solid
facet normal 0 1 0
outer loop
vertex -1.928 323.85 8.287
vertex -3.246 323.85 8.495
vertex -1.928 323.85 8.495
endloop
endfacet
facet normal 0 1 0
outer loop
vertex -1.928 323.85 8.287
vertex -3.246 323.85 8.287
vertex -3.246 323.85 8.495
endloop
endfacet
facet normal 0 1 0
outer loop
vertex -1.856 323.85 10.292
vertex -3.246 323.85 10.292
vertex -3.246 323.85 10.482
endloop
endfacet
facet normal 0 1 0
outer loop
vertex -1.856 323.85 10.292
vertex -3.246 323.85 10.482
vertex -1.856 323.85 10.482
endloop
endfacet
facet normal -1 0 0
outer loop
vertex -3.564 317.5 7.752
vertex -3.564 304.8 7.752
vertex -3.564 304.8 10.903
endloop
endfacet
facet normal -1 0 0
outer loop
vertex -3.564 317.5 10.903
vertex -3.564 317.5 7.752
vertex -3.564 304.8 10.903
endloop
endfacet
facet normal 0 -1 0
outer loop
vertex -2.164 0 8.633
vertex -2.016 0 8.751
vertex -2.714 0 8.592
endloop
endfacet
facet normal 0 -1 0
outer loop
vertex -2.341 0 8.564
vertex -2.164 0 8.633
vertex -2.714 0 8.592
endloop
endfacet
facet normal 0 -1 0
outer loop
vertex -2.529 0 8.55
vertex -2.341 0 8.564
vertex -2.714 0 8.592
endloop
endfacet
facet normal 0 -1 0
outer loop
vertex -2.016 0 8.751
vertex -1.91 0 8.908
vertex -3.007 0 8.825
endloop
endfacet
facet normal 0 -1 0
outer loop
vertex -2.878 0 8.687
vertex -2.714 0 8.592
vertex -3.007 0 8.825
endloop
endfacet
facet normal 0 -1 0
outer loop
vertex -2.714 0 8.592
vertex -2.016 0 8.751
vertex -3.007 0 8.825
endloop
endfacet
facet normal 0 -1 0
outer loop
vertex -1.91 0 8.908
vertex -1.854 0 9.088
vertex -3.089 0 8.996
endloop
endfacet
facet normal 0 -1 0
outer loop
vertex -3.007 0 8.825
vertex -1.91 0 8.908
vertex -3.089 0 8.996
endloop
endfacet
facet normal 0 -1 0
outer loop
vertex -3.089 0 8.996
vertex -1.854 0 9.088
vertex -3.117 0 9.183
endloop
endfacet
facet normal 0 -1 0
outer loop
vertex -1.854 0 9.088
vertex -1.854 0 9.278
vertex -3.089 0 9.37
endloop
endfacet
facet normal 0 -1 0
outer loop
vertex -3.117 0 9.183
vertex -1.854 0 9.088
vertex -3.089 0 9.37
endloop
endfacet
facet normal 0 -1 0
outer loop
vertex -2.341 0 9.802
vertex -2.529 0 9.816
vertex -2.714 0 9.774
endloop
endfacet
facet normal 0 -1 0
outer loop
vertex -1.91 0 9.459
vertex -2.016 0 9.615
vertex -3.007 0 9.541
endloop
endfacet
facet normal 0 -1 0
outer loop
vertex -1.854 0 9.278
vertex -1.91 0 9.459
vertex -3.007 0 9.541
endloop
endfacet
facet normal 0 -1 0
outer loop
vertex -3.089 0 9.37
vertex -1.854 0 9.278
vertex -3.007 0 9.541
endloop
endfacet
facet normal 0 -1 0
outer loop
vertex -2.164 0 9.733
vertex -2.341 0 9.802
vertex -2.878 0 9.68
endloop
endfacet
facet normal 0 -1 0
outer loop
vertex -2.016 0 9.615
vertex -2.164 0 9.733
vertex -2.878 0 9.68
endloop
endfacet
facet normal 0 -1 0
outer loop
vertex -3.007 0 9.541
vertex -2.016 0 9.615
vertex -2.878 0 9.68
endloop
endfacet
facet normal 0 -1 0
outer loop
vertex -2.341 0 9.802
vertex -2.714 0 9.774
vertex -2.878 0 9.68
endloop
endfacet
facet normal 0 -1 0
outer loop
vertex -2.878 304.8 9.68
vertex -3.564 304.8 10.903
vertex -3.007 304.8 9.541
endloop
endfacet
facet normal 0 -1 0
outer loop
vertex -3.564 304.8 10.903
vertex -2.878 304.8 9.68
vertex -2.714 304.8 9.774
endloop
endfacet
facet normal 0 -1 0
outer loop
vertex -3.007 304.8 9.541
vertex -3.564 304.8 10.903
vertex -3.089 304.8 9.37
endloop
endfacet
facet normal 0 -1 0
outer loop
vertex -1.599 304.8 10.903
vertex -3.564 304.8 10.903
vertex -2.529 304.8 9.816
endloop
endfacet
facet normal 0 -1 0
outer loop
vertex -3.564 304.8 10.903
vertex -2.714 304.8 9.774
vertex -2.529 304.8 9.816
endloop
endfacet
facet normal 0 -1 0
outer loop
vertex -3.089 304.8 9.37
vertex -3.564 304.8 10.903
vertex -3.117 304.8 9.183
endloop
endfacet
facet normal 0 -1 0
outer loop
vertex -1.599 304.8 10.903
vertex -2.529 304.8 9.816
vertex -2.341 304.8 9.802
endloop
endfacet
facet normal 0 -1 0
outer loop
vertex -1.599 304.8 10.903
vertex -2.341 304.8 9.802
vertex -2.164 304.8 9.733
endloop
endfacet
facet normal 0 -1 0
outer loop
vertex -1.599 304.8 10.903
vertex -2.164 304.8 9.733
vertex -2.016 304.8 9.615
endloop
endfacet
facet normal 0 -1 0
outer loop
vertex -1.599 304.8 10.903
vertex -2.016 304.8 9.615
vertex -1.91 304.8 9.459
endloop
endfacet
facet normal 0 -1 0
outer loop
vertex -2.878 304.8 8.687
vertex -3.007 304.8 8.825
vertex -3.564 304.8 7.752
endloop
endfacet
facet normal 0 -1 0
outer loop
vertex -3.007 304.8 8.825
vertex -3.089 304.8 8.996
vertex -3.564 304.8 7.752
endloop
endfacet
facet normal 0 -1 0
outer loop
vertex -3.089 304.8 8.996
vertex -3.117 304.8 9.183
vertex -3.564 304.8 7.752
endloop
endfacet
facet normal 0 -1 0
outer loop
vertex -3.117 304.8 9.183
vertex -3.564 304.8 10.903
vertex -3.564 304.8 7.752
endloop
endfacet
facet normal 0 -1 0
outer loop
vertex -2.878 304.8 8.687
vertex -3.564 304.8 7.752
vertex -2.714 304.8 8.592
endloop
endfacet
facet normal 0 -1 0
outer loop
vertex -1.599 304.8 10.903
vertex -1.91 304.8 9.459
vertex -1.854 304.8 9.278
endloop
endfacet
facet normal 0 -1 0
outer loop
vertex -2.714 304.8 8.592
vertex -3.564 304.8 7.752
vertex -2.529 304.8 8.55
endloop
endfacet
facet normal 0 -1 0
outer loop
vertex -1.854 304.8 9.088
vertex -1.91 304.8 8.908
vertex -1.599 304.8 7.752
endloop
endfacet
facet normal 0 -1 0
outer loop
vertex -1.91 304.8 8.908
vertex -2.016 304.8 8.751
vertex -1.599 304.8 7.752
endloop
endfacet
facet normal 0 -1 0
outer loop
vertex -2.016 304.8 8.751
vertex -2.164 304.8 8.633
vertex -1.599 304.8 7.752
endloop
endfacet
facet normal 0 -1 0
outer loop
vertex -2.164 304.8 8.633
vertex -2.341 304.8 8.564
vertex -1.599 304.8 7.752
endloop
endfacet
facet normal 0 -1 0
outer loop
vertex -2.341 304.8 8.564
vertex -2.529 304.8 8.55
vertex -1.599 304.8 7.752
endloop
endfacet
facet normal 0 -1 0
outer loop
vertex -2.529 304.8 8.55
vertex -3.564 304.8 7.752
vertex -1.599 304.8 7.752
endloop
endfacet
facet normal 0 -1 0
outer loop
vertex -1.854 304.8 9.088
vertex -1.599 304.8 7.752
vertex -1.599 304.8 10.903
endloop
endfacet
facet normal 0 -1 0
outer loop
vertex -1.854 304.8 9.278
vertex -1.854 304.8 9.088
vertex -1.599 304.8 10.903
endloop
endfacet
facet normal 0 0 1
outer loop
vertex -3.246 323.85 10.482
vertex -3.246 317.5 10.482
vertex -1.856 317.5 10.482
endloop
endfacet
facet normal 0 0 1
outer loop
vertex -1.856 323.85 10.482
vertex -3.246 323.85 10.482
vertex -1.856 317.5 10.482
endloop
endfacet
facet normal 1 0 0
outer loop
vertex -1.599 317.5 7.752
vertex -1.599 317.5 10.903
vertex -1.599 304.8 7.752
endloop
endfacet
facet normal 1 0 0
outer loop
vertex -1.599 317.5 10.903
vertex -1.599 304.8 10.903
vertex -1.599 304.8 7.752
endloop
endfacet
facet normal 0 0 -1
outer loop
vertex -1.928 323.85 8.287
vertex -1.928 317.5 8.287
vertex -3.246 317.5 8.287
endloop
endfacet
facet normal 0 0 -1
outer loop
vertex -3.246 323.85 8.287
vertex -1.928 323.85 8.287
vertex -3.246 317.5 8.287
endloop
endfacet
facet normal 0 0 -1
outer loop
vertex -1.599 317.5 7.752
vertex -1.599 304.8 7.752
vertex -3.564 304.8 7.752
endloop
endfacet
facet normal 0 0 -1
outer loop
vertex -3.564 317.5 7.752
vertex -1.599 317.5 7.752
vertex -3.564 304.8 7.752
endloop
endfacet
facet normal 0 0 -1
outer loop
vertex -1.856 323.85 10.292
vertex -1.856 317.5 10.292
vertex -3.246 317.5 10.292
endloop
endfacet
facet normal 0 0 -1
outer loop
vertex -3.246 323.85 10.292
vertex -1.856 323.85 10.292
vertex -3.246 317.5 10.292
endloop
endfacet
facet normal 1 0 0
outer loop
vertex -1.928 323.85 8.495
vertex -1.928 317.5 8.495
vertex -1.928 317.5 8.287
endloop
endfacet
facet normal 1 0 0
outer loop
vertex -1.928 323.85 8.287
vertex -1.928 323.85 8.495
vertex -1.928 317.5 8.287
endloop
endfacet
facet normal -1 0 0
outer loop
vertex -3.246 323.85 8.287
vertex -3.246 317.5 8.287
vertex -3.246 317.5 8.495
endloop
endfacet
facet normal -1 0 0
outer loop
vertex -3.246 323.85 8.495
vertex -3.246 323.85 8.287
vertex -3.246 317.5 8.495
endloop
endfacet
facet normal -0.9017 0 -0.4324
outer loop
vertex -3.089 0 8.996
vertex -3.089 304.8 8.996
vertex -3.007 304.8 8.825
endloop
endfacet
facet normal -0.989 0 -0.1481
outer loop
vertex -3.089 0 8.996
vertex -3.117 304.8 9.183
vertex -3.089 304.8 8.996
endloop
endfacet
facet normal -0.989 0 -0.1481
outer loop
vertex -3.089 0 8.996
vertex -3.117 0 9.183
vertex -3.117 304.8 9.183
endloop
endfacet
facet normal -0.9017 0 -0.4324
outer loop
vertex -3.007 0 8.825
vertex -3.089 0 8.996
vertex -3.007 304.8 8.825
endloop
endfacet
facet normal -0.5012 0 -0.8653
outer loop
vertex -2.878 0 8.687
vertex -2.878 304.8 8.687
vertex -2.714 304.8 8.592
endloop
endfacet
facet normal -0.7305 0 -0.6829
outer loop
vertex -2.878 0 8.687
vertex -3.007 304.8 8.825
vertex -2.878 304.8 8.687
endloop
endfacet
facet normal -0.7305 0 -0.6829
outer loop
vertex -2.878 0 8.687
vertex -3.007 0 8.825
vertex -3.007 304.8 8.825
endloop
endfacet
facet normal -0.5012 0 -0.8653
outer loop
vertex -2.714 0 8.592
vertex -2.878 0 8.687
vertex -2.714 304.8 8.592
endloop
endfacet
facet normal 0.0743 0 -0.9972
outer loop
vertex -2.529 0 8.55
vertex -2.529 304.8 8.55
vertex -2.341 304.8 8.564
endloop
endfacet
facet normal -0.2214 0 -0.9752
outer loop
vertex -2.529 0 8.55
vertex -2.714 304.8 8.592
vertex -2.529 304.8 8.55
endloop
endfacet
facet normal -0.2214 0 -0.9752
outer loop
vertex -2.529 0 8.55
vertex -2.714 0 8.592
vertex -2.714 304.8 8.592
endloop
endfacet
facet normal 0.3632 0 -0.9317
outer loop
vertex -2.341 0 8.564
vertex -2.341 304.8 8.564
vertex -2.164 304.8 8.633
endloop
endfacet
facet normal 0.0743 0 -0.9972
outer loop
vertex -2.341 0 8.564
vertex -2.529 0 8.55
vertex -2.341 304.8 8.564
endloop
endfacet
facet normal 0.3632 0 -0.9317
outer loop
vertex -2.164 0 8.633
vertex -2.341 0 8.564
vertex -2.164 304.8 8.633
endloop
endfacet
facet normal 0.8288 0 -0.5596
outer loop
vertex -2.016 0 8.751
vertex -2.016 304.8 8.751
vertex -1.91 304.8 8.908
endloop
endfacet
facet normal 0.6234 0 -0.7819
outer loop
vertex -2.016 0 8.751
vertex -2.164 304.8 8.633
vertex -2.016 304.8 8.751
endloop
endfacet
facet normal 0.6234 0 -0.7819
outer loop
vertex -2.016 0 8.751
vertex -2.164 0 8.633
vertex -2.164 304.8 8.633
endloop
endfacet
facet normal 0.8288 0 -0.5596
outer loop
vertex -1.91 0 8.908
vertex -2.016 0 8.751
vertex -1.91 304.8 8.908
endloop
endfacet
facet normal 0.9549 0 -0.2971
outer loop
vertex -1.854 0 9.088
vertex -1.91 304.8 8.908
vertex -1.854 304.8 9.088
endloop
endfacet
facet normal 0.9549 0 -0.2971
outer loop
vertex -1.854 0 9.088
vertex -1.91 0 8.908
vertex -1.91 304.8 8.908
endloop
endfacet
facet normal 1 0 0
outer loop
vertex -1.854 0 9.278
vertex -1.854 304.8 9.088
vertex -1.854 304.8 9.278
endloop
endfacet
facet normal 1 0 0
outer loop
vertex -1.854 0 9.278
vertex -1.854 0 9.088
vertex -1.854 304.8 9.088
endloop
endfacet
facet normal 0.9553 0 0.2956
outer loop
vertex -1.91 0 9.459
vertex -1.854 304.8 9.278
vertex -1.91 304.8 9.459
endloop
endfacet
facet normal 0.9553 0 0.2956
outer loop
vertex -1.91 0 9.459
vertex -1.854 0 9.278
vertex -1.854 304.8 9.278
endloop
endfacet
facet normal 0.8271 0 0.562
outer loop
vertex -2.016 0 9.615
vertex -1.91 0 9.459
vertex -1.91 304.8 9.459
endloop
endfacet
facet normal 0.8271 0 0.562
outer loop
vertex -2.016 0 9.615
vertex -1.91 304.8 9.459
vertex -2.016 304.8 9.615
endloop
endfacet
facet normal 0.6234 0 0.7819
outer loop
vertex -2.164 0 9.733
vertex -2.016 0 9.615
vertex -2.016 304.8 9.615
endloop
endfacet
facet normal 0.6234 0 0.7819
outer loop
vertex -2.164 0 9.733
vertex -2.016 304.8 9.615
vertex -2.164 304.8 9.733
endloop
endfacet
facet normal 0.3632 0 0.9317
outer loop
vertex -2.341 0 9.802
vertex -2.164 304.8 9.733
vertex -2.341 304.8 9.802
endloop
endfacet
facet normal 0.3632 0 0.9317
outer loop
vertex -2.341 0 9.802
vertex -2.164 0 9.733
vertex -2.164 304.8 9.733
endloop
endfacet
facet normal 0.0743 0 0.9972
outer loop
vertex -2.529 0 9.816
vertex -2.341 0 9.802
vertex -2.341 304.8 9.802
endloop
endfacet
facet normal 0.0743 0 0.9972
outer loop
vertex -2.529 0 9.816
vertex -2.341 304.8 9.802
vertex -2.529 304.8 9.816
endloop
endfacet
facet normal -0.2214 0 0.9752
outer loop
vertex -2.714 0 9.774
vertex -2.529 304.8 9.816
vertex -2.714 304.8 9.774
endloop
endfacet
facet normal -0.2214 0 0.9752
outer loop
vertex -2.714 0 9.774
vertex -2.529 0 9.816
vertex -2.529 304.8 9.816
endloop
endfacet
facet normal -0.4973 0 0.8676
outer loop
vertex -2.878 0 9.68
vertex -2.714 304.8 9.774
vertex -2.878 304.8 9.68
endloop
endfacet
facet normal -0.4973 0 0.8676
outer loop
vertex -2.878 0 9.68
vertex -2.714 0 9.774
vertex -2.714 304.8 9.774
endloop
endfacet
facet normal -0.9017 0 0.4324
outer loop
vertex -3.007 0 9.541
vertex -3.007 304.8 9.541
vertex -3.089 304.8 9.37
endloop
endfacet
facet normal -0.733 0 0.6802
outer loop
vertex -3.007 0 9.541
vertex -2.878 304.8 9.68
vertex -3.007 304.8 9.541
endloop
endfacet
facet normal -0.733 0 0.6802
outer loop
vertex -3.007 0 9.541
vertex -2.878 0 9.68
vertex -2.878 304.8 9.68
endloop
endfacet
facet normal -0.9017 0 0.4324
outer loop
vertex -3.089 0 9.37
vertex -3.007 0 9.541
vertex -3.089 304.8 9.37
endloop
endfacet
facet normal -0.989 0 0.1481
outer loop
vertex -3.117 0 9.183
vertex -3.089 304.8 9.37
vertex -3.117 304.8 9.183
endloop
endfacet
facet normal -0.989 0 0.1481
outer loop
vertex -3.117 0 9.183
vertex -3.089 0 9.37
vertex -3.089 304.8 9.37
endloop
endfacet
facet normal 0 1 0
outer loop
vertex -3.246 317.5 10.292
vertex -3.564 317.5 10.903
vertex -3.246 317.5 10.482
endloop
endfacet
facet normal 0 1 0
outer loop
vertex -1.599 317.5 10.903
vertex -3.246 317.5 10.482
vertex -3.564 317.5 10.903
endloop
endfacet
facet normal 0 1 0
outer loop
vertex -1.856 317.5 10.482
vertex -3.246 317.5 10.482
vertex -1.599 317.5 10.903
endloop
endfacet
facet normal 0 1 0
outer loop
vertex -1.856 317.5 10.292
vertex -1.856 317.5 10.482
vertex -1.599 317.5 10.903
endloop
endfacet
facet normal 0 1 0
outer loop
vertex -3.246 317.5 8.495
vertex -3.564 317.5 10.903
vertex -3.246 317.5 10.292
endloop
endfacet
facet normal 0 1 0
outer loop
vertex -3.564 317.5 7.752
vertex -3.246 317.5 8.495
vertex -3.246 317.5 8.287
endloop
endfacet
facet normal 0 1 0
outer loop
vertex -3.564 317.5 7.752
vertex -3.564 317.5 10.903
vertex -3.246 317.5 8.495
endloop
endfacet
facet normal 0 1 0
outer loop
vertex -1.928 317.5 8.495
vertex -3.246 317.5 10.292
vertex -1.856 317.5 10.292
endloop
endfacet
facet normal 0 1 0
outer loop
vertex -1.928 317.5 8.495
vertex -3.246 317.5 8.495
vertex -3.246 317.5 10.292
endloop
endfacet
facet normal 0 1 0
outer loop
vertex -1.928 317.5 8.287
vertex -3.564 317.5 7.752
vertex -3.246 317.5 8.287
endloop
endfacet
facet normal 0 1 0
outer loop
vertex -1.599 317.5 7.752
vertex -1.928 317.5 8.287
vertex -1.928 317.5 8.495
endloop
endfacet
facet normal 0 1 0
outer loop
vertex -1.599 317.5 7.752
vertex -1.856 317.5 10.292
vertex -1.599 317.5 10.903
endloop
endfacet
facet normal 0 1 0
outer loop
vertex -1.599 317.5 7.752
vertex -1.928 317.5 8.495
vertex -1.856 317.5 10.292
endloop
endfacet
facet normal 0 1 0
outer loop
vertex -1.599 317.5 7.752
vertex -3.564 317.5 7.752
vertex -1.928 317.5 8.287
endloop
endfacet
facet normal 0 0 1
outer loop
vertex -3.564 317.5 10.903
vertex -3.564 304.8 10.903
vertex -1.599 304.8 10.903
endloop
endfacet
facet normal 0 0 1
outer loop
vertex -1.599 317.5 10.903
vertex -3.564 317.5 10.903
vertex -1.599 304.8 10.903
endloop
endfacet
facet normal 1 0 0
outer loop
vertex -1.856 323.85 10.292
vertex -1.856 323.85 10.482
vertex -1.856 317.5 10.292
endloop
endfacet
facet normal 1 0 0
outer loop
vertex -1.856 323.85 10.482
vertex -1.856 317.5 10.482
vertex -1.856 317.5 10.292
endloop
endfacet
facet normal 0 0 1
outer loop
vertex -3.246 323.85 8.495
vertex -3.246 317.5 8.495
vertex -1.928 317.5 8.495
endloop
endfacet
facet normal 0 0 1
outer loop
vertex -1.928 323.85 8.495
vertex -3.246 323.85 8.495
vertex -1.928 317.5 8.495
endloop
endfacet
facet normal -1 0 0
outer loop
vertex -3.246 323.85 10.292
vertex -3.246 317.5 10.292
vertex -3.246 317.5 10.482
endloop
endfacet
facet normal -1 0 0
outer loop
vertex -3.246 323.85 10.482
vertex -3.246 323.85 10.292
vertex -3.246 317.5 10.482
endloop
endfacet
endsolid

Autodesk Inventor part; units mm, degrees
ref_plane "YZ Plane" through (0, 0, 0) normal (1, 0, 0) x (0, 1, 0)
ref_plane "XZ Plane" through (0, 0, 0) normal (0, 1, 0) x (-1, 0, 0)
ref_plane "XY Plane" through (0, 0, 0) normal (0, 0, 1) x (1, 0, 0)
sketch "Sketch1" plane through (0, 0, 0) normal (0, 1, 0) x (-1, 0, 0)
  circle A0 centre (2.4819, 9.1831) radius 0.635
  point P0 (0, 0)
  dimension "d0" = 1.27
extrude "Extrusion1" add sketch "Sketch1" along normal blind 304.8
sketch "Sketch2" plane through (-2.4819, 304.8, 9.1831) normal (0, 1, 0) x (1, 0, 0)
  line L0 (-1.0816, -1.7196) -> (0.8833, -1.7196)
  line L1 (0.8833, -1.7196) -> (0.8833, 1.4308)
  line L2 (0.8833, 1.4308) -> (-1.0816, 1.4308)
  line L3 (-1.0816, 1.4308) -> (-1.0816, -1.7196)
  point P0 (2.4819, 9.1831)
extrude "Extrusion2" add sketch "Sketch2" along normal blind 12.7
sketch "Sketch3" plane through (-2.4819, 317.5, 9.1831) normal (0, 1, 0) x (1, 0, 0)
  line L0 (-0.7645, -1.2984) -> (0.6263, -1.2984)
  line L1 (0.6263, -1.2984) -> (0.6263, -1.1087)
  line L2 (0.6263, -1.1087) -> (-0.7645, -1.1087)
  line L3 (-0.7645, -1.1087) -> (-0.7645, -1.2984)
  line L4 (-0.7645, 0.6885) -> (0.5541, 0.6885)
  line L5 (0.5541, 0.6885) -> (0.5541, 0.8962)
  line L6 (0.5541, 0.8962) -> (-0.7645, 0.8962)
  line L7 (-0.7645, 0.8962) -> (-0.7645, 0.6885)
  point P0 (2.4819, 9.1831)
extrude "Extrusion3" add sketch "Sketch3" along normal blind 6.35
properties part number "plug"
